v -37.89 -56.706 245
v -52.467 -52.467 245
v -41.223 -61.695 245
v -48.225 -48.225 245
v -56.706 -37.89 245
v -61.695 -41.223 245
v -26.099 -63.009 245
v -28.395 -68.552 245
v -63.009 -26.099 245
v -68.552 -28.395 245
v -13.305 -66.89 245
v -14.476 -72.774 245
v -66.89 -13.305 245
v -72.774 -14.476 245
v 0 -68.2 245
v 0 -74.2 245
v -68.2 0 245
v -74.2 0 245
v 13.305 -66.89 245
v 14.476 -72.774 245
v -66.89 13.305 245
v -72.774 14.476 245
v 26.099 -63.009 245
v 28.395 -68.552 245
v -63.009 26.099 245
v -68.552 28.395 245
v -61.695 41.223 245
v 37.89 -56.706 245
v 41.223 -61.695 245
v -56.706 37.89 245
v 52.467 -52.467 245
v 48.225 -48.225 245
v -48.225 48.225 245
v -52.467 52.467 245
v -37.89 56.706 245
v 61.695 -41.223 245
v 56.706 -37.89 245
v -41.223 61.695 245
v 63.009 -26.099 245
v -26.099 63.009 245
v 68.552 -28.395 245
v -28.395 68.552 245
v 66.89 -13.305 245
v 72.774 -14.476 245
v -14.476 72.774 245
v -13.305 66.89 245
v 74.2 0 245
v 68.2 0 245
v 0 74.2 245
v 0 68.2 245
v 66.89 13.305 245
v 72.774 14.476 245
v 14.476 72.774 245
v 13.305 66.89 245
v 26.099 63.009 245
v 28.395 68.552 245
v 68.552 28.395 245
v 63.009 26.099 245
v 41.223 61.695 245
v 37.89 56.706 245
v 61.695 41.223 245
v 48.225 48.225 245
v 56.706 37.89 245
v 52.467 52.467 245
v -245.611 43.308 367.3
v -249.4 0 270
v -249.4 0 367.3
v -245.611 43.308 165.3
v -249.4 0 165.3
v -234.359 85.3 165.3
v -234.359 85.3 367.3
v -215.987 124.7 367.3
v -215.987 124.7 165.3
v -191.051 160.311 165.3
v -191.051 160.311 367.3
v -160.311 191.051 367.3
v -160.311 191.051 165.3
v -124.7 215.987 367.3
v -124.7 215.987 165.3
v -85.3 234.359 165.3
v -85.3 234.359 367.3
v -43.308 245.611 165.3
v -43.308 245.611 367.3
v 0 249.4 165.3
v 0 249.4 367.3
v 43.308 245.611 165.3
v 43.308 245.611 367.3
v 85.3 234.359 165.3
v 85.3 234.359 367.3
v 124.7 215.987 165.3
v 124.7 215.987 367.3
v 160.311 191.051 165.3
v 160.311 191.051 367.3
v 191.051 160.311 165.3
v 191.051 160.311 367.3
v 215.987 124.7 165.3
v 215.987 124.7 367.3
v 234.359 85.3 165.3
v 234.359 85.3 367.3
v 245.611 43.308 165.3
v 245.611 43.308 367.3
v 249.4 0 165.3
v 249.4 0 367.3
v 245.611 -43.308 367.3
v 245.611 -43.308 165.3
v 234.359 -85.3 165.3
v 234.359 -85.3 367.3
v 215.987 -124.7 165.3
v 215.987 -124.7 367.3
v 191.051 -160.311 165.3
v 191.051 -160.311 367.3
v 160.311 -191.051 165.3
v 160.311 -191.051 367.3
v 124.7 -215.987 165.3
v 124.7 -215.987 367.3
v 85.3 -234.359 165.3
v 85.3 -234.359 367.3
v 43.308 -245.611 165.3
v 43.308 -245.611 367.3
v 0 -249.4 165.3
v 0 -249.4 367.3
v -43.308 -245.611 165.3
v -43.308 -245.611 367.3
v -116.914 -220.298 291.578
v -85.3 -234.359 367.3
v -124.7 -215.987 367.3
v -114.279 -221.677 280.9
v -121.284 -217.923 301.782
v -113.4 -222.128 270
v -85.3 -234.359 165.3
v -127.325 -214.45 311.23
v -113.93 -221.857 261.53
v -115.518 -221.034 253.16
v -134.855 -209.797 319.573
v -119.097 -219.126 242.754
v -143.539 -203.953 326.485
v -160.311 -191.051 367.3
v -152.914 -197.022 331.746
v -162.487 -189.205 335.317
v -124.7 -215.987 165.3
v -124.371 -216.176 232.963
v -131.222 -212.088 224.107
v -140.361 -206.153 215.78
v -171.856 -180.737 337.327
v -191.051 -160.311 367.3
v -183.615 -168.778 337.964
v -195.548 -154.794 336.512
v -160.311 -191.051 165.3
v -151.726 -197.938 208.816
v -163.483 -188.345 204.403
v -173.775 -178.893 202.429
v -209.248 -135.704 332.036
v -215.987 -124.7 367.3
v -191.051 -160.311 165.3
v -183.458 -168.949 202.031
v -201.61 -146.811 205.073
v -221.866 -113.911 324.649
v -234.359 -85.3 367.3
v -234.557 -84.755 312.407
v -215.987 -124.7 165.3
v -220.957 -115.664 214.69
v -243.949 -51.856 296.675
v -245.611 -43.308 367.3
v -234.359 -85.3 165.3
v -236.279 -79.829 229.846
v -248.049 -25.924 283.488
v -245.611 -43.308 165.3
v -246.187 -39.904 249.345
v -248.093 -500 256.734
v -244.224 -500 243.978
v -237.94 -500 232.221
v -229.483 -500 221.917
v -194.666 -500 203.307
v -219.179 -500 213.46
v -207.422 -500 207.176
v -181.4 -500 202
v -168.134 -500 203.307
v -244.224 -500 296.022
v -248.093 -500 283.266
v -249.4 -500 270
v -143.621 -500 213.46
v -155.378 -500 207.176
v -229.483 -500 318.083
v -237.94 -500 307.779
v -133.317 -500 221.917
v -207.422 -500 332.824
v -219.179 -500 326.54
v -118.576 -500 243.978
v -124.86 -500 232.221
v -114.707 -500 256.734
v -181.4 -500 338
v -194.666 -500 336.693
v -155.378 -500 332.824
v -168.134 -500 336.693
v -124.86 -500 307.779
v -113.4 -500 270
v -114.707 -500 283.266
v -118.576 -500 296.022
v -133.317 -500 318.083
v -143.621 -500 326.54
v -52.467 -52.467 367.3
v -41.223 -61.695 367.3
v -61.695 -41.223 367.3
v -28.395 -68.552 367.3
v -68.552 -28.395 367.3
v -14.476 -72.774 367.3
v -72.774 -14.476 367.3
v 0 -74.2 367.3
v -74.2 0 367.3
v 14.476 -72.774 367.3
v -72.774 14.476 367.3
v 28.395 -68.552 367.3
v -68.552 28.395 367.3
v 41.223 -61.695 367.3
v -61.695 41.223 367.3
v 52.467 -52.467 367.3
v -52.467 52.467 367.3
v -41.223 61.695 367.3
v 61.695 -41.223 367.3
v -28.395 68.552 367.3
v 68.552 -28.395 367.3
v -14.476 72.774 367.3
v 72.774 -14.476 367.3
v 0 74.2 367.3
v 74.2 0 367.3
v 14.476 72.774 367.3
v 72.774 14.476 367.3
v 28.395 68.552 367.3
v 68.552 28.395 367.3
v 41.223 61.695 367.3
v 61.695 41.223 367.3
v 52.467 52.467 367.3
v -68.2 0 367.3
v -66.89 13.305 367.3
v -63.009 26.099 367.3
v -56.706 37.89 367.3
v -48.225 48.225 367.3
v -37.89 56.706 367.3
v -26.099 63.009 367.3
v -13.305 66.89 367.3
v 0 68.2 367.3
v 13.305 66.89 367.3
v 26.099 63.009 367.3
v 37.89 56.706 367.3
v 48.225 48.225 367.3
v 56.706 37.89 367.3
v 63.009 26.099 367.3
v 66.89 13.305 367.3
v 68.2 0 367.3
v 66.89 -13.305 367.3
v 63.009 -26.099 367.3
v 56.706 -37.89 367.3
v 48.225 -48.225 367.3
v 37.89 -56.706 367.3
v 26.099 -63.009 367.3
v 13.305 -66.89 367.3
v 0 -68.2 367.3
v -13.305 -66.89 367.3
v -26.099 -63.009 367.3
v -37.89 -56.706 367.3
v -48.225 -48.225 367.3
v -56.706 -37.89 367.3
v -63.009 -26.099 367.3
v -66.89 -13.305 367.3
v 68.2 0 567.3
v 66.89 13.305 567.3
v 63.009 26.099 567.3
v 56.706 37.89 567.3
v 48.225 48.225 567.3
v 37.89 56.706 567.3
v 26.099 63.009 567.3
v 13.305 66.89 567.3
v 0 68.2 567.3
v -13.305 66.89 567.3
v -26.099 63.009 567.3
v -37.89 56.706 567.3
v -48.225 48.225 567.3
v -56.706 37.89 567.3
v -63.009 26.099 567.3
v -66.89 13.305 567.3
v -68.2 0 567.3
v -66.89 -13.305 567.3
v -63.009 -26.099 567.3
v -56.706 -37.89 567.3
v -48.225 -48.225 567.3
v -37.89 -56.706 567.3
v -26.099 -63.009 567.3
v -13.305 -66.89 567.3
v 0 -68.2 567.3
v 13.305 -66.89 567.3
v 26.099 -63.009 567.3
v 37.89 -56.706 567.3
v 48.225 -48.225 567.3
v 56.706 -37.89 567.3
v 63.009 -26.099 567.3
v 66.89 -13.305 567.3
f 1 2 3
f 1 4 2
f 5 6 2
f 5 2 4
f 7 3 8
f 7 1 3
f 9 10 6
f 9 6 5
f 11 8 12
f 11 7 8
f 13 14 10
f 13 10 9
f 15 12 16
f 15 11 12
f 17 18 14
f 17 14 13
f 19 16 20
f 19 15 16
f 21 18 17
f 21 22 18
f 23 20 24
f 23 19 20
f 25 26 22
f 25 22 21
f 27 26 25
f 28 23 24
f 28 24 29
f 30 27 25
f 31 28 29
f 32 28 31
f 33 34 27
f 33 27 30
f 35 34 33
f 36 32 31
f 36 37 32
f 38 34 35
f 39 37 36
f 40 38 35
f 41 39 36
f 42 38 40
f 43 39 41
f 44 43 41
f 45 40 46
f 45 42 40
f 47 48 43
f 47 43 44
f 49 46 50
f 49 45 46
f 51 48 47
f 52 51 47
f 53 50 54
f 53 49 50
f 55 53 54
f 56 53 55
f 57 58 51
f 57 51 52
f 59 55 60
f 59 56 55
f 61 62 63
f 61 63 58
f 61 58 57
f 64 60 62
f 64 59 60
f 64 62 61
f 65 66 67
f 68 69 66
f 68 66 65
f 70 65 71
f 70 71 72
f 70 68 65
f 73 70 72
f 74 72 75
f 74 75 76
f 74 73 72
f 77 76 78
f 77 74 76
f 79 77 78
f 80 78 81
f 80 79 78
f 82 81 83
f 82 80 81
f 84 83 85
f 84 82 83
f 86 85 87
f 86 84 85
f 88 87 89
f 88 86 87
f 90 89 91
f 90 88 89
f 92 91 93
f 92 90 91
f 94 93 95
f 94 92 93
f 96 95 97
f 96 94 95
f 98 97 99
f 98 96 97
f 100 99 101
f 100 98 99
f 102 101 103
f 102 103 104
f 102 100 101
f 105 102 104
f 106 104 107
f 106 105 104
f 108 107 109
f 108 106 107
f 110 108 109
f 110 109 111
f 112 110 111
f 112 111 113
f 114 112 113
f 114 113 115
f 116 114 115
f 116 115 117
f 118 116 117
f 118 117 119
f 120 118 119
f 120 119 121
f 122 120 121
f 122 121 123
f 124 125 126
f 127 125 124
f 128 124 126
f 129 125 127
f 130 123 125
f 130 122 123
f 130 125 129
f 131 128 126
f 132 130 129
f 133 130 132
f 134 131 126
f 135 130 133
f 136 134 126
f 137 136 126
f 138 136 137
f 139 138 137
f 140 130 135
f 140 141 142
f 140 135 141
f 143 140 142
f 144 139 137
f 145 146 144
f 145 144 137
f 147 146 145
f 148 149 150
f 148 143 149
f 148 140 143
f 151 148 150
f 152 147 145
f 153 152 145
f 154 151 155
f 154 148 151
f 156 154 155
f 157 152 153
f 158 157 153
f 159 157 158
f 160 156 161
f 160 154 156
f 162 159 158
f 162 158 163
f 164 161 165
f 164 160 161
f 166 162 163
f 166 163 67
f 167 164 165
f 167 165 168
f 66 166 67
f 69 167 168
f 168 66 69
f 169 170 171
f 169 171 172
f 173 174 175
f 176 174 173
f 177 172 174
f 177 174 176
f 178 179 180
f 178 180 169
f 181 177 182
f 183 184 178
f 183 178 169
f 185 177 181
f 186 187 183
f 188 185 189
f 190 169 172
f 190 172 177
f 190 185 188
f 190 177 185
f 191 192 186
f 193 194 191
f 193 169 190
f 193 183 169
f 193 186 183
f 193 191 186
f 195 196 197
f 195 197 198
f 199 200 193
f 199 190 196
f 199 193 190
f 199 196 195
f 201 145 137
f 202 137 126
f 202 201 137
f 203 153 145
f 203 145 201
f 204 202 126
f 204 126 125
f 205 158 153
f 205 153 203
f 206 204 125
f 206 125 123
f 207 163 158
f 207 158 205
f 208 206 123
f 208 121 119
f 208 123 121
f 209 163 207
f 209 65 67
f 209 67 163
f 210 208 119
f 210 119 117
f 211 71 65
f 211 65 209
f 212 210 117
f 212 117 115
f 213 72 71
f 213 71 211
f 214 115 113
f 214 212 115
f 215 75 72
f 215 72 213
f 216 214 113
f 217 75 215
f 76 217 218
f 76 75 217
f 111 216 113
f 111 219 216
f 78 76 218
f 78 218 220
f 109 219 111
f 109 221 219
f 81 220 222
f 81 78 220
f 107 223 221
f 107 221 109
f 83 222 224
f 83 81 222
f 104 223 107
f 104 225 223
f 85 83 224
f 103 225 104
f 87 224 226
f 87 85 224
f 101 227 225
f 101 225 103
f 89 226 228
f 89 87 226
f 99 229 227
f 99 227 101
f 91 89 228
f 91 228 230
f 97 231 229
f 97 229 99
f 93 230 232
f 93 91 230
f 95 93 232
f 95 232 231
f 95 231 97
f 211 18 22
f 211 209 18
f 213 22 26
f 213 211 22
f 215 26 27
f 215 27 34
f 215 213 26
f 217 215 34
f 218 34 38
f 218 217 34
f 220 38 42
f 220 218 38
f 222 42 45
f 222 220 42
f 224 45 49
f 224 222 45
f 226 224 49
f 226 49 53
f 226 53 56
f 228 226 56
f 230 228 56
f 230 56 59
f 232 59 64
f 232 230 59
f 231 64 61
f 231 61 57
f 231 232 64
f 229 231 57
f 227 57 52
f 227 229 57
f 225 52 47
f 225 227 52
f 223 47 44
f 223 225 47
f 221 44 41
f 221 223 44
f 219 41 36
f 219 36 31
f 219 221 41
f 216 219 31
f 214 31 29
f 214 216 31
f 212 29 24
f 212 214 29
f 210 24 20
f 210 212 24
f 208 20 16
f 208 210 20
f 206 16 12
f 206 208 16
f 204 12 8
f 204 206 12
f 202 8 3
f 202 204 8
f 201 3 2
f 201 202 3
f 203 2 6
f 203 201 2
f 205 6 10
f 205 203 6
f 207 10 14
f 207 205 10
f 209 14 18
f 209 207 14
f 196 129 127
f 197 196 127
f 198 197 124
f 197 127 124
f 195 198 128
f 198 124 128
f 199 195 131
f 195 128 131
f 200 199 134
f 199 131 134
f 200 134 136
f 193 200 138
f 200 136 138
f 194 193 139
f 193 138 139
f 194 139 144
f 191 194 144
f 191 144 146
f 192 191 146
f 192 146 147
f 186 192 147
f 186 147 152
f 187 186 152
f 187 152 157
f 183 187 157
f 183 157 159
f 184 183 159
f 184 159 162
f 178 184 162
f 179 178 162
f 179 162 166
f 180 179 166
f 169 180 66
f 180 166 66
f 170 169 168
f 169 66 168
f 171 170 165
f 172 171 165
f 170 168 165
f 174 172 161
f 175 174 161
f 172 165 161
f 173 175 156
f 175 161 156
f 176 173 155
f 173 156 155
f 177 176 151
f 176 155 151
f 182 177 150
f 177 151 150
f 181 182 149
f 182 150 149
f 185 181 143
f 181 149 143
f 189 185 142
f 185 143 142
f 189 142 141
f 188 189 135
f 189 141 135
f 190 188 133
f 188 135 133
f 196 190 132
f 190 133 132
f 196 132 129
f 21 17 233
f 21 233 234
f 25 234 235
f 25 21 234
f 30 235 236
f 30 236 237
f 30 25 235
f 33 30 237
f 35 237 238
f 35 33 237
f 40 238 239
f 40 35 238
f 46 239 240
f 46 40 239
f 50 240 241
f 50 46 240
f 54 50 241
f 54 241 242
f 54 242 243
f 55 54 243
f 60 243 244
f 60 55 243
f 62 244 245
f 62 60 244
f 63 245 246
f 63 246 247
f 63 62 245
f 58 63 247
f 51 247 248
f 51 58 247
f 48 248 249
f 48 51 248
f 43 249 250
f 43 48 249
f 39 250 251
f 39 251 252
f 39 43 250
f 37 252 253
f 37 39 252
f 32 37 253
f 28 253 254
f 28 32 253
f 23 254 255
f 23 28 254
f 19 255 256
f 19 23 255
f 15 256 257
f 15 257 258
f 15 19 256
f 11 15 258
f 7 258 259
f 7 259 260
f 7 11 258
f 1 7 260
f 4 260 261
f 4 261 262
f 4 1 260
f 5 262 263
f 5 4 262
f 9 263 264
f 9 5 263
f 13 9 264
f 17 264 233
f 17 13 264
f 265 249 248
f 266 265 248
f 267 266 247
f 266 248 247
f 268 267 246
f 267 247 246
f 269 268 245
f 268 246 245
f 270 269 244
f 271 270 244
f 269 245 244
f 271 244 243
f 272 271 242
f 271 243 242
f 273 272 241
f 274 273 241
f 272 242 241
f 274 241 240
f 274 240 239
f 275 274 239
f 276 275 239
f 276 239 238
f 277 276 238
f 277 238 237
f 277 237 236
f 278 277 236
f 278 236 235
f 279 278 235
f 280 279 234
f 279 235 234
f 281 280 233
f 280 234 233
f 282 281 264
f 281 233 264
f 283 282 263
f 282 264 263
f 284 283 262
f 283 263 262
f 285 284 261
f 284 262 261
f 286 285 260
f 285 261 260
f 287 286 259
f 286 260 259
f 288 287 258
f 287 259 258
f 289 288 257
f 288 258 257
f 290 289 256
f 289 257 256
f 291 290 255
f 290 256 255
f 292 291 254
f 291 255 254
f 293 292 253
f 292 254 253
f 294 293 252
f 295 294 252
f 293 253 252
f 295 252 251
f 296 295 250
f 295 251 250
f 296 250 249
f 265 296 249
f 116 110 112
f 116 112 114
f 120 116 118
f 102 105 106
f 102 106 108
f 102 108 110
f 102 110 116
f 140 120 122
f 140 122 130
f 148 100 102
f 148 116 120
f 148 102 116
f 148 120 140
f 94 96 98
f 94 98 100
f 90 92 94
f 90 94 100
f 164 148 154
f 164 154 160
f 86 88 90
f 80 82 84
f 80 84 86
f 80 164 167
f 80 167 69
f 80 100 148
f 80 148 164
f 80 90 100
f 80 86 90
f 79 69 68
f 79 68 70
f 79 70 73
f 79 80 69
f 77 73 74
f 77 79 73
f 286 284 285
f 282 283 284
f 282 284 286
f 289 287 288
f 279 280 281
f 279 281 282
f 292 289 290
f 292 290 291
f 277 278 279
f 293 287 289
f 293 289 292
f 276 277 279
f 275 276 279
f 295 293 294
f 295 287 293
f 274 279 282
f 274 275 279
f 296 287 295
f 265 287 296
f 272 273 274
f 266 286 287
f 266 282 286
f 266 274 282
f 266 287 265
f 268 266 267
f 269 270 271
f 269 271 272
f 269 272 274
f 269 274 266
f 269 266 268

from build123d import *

# Parameters (mm, degrees)
F2_R      = 68
F3_DEPTH  = 500
F1_FACE_R = 68.2
F4_DEPTH  = 200


with BuildPart() as f1:
    # F0 (on Front) → F1 (revolve)
    with BuildSketch(Plane.XZ):
        Polygon((-249.4, 165.3), (-114, 165.3), (0, 165.3), (0, 367.3), (-68.2, 367.3), (-68.2, 245), (-74.2, 245), (-74.2, 367.3), (-249.4, 367.3), align=None)
    revolve(axis=Axis((0, 0, 266.3), (0, 0, -1)))

    # F2 (on Front) → F3 (join)
    with BuildSketch(Plane.XZ):
        with Locations((-181.4, 270)):
            Circle(F2_R)
    extrude(amount=F3_DEPTH)

    # F1_face (on face) → F4 (join)
    with BuildSketch(Plane.XY.offset(367.3)):
        Circle(F1_FACE_R)
    extrude(amount=F4_DEPTH)


solid = f1.part
